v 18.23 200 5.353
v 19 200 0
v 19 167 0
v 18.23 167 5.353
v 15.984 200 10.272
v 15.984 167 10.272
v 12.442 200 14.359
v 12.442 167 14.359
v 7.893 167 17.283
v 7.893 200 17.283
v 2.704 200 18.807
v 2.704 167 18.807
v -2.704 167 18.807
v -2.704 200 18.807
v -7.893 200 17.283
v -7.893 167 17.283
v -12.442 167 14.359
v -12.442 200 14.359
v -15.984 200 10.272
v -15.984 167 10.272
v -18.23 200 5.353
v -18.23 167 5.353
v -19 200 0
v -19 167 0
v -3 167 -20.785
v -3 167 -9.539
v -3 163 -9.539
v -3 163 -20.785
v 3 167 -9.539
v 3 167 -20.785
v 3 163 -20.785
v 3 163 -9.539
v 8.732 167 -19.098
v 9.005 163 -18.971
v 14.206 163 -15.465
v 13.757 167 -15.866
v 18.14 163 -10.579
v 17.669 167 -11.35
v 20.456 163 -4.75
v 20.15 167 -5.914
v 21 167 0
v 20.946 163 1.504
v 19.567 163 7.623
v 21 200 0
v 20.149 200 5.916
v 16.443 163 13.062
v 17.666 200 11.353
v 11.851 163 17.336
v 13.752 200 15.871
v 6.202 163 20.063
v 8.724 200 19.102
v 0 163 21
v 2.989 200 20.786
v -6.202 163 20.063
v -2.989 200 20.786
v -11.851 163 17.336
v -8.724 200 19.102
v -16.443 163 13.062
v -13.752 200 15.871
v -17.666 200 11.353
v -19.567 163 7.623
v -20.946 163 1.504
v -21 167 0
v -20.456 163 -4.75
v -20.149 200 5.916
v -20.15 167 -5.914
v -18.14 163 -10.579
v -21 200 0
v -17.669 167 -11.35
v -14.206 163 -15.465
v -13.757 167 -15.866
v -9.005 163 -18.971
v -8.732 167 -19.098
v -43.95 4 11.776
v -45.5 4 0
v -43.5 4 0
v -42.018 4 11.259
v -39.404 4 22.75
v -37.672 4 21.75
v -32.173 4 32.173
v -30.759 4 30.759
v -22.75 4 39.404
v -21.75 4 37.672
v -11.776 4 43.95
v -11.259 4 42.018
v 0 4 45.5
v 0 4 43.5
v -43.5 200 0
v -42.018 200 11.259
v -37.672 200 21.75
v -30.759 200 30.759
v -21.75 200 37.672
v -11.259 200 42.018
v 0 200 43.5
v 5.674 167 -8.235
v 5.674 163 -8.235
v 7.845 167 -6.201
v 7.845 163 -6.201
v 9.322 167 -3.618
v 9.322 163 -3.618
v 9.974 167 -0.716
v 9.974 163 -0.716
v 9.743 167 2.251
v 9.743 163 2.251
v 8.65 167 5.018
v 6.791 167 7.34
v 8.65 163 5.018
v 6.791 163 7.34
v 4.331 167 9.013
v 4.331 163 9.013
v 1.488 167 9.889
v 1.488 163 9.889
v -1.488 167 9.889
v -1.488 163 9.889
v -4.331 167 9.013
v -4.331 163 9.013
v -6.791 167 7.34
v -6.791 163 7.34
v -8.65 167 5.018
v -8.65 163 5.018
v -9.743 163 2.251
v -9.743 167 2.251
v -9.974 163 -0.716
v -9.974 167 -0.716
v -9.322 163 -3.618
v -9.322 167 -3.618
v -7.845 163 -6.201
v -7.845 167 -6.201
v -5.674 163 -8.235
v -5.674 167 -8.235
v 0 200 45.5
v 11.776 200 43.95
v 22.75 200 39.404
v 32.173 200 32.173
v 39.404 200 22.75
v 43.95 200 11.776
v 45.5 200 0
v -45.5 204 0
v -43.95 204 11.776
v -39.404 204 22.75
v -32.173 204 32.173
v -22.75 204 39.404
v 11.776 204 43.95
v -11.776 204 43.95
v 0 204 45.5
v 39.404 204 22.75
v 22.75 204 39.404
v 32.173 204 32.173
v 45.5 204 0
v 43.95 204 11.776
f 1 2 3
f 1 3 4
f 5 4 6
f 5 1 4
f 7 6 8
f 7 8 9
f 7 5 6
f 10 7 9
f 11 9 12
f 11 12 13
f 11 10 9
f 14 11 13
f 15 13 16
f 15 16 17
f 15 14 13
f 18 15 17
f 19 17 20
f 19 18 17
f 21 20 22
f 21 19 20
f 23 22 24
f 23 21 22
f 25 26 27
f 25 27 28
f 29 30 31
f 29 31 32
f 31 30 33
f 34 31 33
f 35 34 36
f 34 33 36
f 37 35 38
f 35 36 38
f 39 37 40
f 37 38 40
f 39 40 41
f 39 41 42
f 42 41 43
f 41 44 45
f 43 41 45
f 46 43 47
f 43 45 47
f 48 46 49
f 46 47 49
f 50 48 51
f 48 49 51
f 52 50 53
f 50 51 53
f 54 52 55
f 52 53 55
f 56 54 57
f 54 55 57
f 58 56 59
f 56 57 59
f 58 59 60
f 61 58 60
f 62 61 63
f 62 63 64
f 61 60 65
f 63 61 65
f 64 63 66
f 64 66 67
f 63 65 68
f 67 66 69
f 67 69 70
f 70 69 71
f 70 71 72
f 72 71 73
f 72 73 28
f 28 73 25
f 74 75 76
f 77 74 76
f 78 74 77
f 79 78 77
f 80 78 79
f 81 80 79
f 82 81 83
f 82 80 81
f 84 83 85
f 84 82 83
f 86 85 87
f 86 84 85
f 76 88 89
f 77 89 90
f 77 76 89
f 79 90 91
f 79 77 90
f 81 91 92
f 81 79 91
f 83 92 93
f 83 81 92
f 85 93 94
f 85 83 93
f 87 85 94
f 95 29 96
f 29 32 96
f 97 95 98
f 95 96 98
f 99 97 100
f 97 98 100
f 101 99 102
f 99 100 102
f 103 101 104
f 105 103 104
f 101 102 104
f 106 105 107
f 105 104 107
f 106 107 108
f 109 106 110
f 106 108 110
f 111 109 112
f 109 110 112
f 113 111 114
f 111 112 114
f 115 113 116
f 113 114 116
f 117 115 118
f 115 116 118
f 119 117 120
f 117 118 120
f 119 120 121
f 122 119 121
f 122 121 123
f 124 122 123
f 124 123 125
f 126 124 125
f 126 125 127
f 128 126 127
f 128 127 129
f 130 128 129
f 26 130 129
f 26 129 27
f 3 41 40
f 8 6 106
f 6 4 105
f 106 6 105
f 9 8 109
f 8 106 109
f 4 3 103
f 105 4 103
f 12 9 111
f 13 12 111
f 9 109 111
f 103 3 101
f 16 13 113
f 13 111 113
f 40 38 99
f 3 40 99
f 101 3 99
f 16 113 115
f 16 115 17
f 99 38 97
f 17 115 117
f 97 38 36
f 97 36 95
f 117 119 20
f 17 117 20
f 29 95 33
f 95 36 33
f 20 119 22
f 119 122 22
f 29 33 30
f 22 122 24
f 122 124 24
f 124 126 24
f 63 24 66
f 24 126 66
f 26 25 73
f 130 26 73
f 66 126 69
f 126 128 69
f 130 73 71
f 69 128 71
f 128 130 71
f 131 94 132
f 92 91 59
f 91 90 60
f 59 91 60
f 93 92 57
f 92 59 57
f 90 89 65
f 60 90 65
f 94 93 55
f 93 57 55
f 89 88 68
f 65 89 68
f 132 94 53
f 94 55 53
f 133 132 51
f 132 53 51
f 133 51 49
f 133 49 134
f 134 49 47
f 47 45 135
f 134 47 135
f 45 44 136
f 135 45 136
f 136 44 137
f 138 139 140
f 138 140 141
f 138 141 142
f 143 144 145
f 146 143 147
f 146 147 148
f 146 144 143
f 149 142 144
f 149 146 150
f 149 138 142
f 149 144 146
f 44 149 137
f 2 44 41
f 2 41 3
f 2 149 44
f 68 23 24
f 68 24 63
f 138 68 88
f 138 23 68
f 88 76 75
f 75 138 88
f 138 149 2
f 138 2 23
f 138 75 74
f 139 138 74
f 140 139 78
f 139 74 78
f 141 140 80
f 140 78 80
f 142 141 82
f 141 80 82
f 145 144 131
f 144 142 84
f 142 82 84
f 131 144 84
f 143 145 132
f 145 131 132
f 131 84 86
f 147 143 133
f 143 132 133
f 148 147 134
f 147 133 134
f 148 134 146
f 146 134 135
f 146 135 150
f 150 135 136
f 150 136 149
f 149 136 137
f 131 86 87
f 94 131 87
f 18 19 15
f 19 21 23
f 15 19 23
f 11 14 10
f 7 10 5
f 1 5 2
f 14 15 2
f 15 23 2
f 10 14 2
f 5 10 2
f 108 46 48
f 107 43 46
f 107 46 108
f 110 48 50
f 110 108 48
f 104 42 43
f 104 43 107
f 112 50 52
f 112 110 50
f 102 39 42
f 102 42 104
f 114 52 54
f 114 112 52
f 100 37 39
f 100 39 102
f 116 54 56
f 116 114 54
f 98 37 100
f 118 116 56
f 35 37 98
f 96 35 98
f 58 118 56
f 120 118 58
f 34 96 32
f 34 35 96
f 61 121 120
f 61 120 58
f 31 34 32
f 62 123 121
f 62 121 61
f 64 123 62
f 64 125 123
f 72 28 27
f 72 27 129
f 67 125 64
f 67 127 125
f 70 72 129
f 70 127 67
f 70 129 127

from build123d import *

# Parameters (mm, degrees)
CROQUIS1_R              = 43.5
CROQUIS1_R_2            = 30
SALIENTE_EXTRUIR1_DEPTH = 4
CROQUIS2_R              = 30
CROQUIS2_R_2            = 20
SALIENTE_EXTRUIR2_DEPTH = 4
CROQUIS3_R              = 30
CROQUIS3_R_2            = 20
CORTAR_EXTRUIR1_DEPTH   = 2
CROQUIS5_R              = 3
CORTAR_EXTRUIR3_DEPTH   = 4
SALIENTE_EXTRUIR3_DEPTH = 200
CROQUIS8_R              = 45.5
SALIENTE_EXTRUIR4_DEPTH = 4
CROQUIS9_R              = 21
CROQUIS9_R_2            = 19
SALIENTE_EXTRUIR5_DEPTH = 33
CORTAR_EXTRUIR6_START   = -33
CORTAR_EXTRUIR6_DEPTH   = 33
CROQUIS11_R             = 21
SALIENTE_EXTRUIR6_DEPTH = 4
CORTAR_EXTRUIR7_START   = -4
CORTAR_EXTRUIR7_DEPTH   = 4
CROQUIS14_R             = 45.5
CORTAR_EXTRUIR9_DEPTH   = 4
CORTAR_EXTRUIR11_DEPTH  = 200
CROQUIS16_R             = 10
CORTAR_EXTRUIR12_DEPTH  = 4
CORTAR_EXTRUIR13_START  = 200
CORTAR_EXTRUIR13_DEPTH  = 4


with BuildPart() as part:
    # Croquis1 → Saliente-Extruir1 (new body)
    with BuildSketch(Plane(origin=(0, 0, 0), x_dir=(1, 0, 0), z_dir=(0, 1, 0))):
        with Locations(Location((0, 0, 0), (0, 0, 270))):
            Circle(CROQUIS1_R)
        with Locations(Location((0, 0, 0), (0, 0, 270))):
            Circle(CROQUIS1_R_2, mode=Mode.SUBTRACT)
    extrude(amount=SALIENTE_EXTRUIR1_DEPTH)

    # Croquis2 → Saliente-Extruir2 (add)
    with BuildSketch(Plane(origin=(0, 0, 0), x_dir=(1, 0, 0), z_dir=(0, 1, 0))):
        Circle(CROQUIS2_R)
        with Locations(Location((0, 0, 0), (0, 0, 270))):
            Circle(CROQUIS2_R_2, mode=Mode.SUBTRACT)
    extrude(amount=SALIENTE_EXTRUIR2_DEPTH)

    # Croquis3 → Cortar-Extruir1 (cut)
    with BuildSketch(Plane(origin=(0, 0, 0), x_dir=(1, 0, 0), z_dir=(0, 1, 0))):
        with Locations(Location((0, 0, 0), (0, 0, 270))):
            Circle(CROQUIS3_R)
        with Locations(Location((0, 0, 0), (0, 0, 270))):
            Circle(CROQUIS3_R_2, mode=Mode.SUBTRACT)
    extrude(amount=CORTAR_EXTRUIR1_DEPTH, mode=Mode.SUBTRACT)

    # Croquis5 → Cortar-Extruir3 (cut)
    with BuildSketch(Plane(origin=(0, 0, 0), x_dir=(1, 0, 0), z_dir=(0, 1, 0))):
        with Locations(Location((0, -37.5, 0), (0, 0, 270))):
            Circle(CROQUIS5_R)
        with Locations(Location((-37.5, 0, 0), (0, 0, 270))):
            Circle(CROQUIS5_R)
        with Locations(Location((0, 37.5, 0), (0, 0, 270))):
            Circle(CROQUIS5_R)
        with Locations(Location((37.5, 0, 0), (0, 0, 270))):
            Circle(CROQUIS5_R)
    extrude(amount=CORTAR_EXTRUIR3_DEPTH, mode=Mode.SUBTRACT)

    # Croquis7 → Saliente-Extruir3 (add)
    with BuildSketch(Plane(origin=(0, 0, 0), x_dir=(1, 0, 0), z_dir=(0, 1, 0))):
        with BuildLine():
            Line((-45.5, 0), (-43.5, 0))
            ThreePointArc((-43.5, 0), (0, -43.5), (43.5, 0))
            Line((43.5, 0), (45.5, 0))
            ThreePointArc((45.5, 0), (0, -45.5), (-45.5, 0))
        make_face()
    extrude(amount=SALIENTE_EXTRUIR3_DEPTH)

    # Croquis8 → Saliente-Extruir4 (add)
    with BuildSketch(Plane(origin=(0, 200, 0), x_dir=(1, 0, 0), z_dir=(0, 1, 0))):
        Circle(CROQUIS8_R)
    extrude(amount=SALIENTE_EXTRUIR4_DEPTH)

    # Croquis9 → Saliente-Extruir5 (add)
    with BuildSketch(Plane.XZ.offset(-200)):
        with Locations(Location((0, 0, 0), (0, 0, 90))):
            Circle(CROQUIS9_R)
        with Locations(Location((0, 0, 0), (0, 0, 270))):
            Circle(CROQUIS9_R_2, mode=Mode.SUBTRACT)
    extrude(amount=SALIENTE_EXTRUIR5_DEPTH)

    # Croquis10 → Cortar-Extruir6 (cut)
    with BuildSketch(Plane.XZ.offset(-167).offset(CORTAR_EXTRUIR6_START)):
        with BuildLine():
            Line((21, 0), (-21, 0))
            ThreePointArc((-21, 0), (0, -21), (21, 0))
        make_face()
    extrude(amount=CORTAR_EXTRUIR6_DEPTH, mode=Mode.SUBTRACT)

    # Croquis11 → Saliente-Extruir6 (add)
    with BuildSketch(Plane.XZ.offset(-167)):
        with Locations(Location((0, 0, 0), (0, 0, 180))):
            Circle(CROQUIS11_R)
    extrude(amount=SALIENTE_EXTRUIR6_DEPTH)

    # Croquis12 → Cortar-Extruir7 (cut)
    with BuildSketch(Plane.XZ.offset(-163).offset(CORTAR_EXTRUIR7_START)):
        with BuildLine():
            Line((-3, 0), (-3, -20.784609691))
            ThreePointArc((-3, -20.784609691), (0, -21), (3, -20.784609691))
            Line((3, -20.784609691), (3, 0))
            ThreePointArc((3, 0), (0, 3), (-3, 0))
        make_face()
    extrude(amount=CORTAR_EXTRUIR7_DEPTH, mode=Mode.SUBTRACT)

    # Croquis14 → Cortar-Extruir9 (cut)
    with BuildSketch(Plane.XZ):
        Circle(CROQUIS14_R)
    extrude(amount=-CORTAR_EXTRUIR9_DEPTH, mode=Mode.SUBTRACT)

    # Croquis15 → Cortar-Extruir11 (cut)
    with BuildSketch(Plane(origin=(0, 0, 0), x_dir=(1, 0, 0), z_dir=(0, 1, 0))):
        with BuildLine():
            Line((43.5, 0), (45.5, 0))
            ThreePointArc((45.5, 0), (32.173358544, -32.173358544), (0, -45.5))
            Line((0, -45.5), (0, -43.5))
            ThreePointArc((0, -43.5), (30.759144982, -30.759144982), (43.5, 0))
        make_face()
    extrude(amount=CORTAR_EXTRUIR11_DEPTH, mode=Mode.SUBTRACT)

    # Croquis16 → Cortar-Extruir12 (cut)
    with BuildSketch(Plane.XZ.offset(-163)):
        Circle(CROQUIS16_R)
    extrude(amount=-CORTAR_EXTRUIR12_DEPTH, mode=Mode.SUBTRACT)

    # Croquis17 → Cortar-Extruir13 (cut)
    with BuildSketch(Plane(origin=(0, 0, 0), x_dir=(1, 0, 0), z_dir=(0, 1, 0)).offset(CORTAR_EXTRUIR13_START)):
        with BuildLine():
            Line((-45.5, 0), (45.5, 0))
            ThreePointArc((45.5, 0), (0, 45.5), (-45.5, 0))
        make_face()
    extrude(amount=CORTAR_EXTRUIR13_DEPTH, mode=Mode.SUBTRACT)


solid = part.part
